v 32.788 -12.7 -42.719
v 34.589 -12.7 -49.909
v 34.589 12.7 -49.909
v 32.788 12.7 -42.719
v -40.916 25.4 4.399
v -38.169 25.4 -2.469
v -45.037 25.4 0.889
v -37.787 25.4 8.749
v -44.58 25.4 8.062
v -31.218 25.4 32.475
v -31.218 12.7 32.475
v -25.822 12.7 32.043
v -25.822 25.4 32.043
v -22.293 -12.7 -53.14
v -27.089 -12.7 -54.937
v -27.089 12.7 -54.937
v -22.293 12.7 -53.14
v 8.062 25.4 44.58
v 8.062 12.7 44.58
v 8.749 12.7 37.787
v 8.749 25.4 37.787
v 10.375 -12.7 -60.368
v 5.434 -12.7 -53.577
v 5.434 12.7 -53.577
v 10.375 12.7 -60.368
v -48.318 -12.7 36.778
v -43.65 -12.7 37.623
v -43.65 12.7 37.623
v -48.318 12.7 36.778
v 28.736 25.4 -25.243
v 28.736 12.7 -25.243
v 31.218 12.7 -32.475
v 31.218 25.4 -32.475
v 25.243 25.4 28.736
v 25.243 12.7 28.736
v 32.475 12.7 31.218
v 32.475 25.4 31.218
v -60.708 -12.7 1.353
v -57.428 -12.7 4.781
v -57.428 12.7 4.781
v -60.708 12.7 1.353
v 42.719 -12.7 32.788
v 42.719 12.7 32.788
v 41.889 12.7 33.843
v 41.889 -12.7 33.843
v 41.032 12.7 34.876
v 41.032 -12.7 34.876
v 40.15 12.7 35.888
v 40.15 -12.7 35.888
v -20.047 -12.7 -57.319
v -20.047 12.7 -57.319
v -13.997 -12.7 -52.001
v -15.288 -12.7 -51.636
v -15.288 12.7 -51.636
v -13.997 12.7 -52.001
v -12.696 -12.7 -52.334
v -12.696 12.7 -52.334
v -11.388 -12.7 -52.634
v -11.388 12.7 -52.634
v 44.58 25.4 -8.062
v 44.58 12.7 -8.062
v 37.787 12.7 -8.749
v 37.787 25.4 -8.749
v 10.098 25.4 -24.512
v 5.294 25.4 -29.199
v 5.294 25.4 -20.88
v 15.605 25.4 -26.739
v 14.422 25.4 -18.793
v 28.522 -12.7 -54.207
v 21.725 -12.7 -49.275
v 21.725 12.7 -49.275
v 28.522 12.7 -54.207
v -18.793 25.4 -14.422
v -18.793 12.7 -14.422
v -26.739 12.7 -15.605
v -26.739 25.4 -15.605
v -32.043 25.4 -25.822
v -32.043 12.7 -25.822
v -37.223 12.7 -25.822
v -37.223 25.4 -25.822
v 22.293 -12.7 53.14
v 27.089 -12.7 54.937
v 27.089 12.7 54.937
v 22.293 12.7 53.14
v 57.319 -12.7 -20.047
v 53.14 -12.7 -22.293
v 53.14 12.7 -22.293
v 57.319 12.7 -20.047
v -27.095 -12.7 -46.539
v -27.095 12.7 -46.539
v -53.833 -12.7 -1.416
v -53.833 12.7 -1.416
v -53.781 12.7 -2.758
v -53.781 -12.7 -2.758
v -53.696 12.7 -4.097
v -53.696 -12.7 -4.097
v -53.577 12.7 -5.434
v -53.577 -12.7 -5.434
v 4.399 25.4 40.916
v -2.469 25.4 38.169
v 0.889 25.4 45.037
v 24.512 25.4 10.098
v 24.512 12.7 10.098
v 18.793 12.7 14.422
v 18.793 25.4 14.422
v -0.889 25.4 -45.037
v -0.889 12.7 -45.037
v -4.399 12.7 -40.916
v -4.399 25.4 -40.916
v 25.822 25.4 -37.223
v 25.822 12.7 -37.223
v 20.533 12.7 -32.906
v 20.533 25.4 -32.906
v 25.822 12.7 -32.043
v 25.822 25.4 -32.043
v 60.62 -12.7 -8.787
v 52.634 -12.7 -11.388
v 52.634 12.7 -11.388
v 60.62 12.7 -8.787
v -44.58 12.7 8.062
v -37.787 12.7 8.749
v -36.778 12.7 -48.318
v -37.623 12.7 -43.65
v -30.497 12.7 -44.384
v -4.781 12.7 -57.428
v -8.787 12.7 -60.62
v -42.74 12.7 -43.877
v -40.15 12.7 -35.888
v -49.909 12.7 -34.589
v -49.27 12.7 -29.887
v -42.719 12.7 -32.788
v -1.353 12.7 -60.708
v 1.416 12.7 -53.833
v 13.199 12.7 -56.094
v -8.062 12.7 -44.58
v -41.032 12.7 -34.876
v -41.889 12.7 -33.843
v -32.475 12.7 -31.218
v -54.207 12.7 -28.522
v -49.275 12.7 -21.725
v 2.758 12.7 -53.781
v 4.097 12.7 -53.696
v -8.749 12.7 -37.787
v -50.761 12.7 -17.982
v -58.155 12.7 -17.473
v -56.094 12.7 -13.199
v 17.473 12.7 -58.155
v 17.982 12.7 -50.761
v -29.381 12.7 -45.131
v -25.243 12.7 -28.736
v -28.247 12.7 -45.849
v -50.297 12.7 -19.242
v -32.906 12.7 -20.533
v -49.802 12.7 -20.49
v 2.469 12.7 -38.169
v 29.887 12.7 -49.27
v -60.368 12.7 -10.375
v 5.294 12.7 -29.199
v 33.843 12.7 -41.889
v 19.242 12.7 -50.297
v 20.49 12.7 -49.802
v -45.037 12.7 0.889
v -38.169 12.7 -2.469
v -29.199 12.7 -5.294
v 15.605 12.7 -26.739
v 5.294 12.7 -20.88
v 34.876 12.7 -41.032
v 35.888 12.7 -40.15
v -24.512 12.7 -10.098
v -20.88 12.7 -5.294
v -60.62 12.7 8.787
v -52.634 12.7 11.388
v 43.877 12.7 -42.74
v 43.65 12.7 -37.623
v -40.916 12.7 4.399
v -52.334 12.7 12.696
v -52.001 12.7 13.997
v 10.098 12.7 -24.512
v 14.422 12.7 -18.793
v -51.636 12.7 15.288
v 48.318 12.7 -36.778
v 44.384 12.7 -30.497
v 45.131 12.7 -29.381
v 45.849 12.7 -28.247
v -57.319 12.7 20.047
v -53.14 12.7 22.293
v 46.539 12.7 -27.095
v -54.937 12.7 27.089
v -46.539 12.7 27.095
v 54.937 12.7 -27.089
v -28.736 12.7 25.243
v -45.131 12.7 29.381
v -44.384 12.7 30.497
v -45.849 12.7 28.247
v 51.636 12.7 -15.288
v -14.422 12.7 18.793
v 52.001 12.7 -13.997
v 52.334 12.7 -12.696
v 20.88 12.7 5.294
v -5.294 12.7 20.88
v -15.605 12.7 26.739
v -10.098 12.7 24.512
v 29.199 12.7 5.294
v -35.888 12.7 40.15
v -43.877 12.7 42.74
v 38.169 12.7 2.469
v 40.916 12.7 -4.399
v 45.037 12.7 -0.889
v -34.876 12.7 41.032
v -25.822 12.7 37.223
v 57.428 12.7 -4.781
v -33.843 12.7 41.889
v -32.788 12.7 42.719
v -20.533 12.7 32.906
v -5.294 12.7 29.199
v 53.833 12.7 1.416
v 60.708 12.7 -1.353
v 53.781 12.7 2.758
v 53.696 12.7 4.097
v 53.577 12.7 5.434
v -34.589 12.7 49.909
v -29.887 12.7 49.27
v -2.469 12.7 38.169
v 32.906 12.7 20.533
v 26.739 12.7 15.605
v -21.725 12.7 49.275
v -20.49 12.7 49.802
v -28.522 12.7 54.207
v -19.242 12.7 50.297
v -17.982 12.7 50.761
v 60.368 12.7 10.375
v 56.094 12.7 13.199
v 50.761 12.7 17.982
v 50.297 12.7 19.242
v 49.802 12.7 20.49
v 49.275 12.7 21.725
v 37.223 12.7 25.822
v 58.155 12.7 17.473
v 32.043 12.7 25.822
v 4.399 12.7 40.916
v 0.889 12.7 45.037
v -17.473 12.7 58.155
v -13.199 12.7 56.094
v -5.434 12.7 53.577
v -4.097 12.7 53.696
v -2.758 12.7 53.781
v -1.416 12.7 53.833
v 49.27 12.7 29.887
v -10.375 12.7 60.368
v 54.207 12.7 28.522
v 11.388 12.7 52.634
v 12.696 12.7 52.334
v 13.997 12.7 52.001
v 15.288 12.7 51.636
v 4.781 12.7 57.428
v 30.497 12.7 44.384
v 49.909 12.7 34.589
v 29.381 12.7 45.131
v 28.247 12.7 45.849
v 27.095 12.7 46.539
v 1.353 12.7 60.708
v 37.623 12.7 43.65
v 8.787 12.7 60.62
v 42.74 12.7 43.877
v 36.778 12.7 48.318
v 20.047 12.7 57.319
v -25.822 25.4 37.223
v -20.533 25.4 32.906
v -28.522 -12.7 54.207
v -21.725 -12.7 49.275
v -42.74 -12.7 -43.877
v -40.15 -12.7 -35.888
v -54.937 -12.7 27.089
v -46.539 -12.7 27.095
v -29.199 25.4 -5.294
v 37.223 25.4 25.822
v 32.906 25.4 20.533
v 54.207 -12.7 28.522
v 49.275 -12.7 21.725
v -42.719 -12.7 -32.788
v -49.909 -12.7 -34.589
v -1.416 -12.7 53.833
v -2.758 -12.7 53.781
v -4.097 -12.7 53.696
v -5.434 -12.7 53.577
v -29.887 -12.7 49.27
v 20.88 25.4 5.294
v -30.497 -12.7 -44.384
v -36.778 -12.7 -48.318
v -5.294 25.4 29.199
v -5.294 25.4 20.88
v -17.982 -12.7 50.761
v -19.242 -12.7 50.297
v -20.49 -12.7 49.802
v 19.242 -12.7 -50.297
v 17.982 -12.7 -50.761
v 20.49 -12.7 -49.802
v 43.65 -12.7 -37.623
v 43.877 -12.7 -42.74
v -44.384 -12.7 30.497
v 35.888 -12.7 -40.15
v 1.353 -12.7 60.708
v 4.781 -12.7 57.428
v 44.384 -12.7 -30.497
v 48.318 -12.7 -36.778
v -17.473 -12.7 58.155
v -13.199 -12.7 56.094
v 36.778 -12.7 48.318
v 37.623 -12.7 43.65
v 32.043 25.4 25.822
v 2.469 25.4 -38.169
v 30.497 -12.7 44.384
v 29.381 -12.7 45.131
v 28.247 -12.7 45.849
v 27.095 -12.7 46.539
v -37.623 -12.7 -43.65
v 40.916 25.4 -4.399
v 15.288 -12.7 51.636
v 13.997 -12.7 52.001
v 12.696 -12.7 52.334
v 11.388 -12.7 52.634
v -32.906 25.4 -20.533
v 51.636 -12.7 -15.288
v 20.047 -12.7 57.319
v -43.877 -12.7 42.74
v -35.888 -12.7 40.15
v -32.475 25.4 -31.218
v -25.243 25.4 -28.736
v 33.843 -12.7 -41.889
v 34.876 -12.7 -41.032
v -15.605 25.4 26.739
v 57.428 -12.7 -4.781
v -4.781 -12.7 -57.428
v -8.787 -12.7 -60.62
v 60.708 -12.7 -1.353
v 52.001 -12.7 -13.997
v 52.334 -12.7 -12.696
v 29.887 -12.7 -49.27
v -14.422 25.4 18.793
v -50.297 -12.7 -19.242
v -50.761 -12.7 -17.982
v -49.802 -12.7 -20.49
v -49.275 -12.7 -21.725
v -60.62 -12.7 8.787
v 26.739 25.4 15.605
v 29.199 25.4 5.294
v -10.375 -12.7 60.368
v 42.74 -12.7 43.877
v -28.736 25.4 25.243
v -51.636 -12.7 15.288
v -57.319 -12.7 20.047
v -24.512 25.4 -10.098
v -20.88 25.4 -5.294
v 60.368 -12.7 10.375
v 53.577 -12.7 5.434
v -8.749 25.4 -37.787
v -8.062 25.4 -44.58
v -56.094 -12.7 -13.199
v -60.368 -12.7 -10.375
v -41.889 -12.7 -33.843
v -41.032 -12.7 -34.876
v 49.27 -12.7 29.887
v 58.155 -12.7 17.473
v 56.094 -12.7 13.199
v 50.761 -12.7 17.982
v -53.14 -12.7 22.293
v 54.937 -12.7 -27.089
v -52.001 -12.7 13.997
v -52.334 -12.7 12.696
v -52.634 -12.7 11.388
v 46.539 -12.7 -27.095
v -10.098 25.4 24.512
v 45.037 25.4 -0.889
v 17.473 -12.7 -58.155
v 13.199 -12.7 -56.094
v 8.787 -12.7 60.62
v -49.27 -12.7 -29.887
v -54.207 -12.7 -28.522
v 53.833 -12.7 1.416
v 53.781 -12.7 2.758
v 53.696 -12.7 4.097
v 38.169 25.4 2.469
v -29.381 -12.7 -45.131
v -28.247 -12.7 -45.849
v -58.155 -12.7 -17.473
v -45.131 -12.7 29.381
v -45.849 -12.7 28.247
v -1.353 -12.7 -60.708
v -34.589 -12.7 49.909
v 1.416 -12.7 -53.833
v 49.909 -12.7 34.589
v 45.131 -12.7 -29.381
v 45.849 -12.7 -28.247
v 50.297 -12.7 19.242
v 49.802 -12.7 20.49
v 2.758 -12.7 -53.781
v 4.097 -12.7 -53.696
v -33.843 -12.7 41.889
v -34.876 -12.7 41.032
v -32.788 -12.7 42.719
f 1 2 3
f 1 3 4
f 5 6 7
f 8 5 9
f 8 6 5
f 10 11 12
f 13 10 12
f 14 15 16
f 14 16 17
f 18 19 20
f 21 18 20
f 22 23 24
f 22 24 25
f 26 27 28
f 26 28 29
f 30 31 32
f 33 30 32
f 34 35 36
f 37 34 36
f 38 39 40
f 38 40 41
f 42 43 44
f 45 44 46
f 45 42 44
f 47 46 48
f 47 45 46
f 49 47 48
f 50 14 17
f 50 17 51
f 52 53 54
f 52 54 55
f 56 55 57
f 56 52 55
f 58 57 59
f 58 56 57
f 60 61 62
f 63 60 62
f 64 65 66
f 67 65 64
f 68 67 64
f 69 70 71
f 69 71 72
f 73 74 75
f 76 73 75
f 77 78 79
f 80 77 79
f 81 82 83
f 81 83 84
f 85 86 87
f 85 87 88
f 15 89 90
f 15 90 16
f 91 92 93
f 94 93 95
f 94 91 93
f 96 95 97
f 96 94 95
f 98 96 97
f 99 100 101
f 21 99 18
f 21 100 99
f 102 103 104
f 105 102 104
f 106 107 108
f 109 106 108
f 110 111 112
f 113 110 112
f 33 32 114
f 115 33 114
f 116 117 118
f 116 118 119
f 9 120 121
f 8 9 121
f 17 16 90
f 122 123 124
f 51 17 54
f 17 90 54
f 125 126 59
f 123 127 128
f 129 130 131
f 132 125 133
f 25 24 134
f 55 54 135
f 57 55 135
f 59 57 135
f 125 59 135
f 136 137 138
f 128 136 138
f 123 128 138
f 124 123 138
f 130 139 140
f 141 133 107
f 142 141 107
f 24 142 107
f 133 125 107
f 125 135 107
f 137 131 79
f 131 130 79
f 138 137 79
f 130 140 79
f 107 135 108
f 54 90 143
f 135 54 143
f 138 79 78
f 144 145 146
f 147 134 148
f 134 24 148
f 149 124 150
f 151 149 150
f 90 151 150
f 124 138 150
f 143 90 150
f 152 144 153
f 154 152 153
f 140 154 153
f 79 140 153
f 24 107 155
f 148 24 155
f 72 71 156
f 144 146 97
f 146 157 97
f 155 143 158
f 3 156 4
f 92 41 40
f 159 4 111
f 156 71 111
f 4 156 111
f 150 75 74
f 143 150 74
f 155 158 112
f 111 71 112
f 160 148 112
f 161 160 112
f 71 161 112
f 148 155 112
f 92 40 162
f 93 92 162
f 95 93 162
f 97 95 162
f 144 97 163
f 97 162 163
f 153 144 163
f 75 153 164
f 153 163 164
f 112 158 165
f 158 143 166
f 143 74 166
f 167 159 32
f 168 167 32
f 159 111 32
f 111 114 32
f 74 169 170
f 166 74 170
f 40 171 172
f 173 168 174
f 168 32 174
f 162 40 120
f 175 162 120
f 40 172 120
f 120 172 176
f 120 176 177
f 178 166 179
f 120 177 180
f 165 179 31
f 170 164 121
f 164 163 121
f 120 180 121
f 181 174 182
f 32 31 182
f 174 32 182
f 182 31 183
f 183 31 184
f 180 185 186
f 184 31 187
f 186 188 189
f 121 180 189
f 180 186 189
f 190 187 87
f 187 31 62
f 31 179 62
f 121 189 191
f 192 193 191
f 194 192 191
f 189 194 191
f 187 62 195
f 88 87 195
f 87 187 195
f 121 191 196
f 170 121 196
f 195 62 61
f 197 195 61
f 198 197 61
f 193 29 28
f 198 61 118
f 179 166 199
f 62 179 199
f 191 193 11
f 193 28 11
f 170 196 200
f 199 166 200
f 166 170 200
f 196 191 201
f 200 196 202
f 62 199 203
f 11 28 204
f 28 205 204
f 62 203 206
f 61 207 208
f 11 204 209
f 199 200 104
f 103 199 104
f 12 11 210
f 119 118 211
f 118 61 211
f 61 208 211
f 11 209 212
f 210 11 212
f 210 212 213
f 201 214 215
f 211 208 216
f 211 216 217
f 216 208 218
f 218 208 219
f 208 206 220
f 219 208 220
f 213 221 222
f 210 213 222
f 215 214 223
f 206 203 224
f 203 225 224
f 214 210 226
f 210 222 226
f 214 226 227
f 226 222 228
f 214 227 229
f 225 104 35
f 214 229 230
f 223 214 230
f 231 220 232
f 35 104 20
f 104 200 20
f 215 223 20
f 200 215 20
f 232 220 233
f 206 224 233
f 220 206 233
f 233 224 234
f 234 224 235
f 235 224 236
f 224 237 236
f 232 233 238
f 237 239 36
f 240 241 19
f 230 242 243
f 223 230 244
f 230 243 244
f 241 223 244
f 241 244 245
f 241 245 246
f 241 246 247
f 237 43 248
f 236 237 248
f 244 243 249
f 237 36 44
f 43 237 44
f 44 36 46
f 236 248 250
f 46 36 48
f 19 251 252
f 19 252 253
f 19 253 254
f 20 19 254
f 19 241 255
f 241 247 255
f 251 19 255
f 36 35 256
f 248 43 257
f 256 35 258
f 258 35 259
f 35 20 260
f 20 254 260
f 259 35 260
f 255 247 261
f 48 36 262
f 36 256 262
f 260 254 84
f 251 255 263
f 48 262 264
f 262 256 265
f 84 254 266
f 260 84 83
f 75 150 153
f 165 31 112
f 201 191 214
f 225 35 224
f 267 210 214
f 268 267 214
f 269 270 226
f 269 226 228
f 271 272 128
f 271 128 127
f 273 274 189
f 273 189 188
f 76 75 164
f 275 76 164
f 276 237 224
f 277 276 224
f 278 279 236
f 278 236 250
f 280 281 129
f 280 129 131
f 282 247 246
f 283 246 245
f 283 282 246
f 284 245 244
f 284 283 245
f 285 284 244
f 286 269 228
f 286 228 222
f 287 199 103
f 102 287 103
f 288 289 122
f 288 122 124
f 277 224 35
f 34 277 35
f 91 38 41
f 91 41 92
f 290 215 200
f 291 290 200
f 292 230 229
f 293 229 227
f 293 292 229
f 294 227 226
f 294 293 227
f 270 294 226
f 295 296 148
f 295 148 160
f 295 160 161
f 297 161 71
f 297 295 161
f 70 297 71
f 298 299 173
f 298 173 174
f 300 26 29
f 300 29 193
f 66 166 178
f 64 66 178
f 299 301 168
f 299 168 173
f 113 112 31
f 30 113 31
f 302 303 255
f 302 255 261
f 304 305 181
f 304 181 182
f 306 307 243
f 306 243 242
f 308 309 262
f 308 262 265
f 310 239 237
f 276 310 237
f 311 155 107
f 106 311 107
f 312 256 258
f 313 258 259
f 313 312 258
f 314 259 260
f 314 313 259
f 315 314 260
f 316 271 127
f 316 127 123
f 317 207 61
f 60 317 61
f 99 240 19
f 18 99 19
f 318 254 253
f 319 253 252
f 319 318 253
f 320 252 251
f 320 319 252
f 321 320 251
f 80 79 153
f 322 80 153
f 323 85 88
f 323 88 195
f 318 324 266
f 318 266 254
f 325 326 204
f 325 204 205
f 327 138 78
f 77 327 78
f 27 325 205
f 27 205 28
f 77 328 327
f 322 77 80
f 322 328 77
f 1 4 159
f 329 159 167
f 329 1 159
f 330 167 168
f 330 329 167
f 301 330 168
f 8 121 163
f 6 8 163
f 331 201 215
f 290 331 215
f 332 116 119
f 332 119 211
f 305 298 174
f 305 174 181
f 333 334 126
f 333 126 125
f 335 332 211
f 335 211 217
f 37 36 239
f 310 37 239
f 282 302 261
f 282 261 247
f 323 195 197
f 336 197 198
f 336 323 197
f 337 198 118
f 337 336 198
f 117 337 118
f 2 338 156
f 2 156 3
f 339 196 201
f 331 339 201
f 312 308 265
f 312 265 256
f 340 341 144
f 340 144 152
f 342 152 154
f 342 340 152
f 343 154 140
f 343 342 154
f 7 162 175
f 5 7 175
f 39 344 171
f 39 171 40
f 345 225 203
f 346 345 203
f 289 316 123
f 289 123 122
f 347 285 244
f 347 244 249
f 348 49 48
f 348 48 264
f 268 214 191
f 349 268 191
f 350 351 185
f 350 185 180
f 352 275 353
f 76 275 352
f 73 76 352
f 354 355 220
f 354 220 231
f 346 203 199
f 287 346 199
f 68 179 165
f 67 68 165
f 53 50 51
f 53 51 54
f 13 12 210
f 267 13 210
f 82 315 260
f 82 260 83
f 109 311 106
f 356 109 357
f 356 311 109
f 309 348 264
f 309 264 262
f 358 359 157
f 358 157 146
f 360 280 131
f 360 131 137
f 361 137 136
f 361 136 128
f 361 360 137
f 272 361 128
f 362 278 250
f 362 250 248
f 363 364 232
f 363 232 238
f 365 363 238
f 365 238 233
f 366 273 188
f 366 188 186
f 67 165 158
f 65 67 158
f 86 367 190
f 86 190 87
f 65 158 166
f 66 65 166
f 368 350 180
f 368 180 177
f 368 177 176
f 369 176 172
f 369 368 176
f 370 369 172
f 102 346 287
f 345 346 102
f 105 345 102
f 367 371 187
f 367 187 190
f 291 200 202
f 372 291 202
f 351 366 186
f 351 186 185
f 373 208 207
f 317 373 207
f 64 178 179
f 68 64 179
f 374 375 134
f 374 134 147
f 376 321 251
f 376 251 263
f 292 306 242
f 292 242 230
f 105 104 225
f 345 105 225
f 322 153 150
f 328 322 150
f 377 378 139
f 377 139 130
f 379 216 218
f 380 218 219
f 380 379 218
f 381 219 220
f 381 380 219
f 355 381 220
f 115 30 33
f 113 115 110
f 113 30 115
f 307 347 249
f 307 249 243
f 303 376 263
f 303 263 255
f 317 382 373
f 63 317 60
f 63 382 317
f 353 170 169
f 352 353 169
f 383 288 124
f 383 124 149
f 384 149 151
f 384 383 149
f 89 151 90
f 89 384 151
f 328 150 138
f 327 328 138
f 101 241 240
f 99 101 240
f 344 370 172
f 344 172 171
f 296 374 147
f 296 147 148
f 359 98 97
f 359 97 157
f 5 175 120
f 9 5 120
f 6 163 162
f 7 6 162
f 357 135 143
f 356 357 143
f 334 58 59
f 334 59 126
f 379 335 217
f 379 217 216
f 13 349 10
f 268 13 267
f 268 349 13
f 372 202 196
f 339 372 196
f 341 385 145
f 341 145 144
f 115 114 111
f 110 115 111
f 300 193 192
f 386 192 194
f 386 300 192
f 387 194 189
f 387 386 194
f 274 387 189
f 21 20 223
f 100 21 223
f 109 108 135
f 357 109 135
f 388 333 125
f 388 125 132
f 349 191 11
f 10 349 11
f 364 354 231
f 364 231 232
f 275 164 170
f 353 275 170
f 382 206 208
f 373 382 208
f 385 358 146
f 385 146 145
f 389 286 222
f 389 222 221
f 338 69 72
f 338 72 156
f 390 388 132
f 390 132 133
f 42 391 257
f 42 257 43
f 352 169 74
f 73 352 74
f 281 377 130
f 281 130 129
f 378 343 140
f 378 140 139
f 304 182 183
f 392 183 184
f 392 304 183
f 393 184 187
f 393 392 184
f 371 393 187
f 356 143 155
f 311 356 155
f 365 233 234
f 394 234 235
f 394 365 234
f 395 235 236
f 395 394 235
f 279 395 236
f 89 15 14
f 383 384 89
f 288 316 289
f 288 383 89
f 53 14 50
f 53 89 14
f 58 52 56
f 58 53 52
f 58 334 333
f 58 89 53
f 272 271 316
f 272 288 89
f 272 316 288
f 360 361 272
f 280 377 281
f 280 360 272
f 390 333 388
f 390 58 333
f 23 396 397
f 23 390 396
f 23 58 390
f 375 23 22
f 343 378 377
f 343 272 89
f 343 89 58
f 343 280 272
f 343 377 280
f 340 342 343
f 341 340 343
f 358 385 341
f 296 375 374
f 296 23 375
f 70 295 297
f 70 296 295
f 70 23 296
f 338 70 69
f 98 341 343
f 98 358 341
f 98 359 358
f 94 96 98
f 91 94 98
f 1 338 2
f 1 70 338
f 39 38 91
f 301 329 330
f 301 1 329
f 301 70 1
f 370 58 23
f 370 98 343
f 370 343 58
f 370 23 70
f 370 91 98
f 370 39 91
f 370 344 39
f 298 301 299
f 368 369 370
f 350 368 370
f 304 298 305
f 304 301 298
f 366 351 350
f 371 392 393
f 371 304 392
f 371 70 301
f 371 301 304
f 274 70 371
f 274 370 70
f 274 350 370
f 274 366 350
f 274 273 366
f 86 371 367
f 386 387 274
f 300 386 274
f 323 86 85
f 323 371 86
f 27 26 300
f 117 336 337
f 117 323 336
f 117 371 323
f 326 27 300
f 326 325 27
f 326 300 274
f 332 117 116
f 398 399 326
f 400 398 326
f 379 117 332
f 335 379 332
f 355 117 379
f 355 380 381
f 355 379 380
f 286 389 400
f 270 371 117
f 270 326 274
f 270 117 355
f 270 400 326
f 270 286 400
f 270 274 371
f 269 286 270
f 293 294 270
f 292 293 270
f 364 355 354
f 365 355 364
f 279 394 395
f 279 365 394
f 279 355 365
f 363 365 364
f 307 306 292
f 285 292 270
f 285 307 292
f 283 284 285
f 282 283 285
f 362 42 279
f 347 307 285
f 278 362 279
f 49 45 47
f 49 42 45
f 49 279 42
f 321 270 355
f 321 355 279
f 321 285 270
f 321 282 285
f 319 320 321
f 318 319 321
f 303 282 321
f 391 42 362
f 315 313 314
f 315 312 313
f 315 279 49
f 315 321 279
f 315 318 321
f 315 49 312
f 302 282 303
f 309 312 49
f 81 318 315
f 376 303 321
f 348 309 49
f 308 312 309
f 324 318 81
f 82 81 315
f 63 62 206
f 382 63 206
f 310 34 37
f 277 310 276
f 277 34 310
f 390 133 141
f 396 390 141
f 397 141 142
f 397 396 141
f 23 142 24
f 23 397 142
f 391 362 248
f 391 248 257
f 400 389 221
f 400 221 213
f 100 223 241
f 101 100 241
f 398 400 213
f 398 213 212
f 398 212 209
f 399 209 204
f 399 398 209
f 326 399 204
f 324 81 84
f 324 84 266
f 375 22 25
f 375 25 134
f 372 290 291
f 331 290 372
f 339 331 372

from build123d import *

# Parameters (mm, degrees)
F0_R            = 53.8517918496
F1_DEPTH        = 12.7
F3_DEPTH        = 25.4
F3_COPIES_COUNT = 20
F5_DEPTH        = 12.7
F5_COPIES_COUNT = 8
F7_DEPTH        = 12.7
F7_COPIES_COUNT = 4


# Not quite as in the source:
# - a pattern or mirror of a feature is missing from the dataset's text; its kind, count and spacing are read off the source's solid


with BuildPart() as f1:
    # F0 (on Front) → F1 (new body, symmetric)
    with BuildSketch(Plane.XZ):
        Circle(F0_R)
    extrude(amount=F1_DEPTH, both=True)

    # F2 (on face) → F3 (join, through all)
    with BuildSketch(Plane.XZ.offset(12.7)):
        Polygon((17.4729507416, -58.154836297), (17.9823680134, -50.7607124264), (5.4343099044, -53.5768957786), (10.3754857555, -60.3680238128), (13.1992083043, -56.0942813754), align=None)
    f3 = extrude(amount=-F3_DEPTH)

    # F3_copies: F3 ×20 about axis
    f3_copies_axis = Axis((0, 0, 0), (0, 1, 0))
    for i in range(1, F3_COPIES_COUNT):
        add(f3.rotate(f3_copies_axis, i * 360 / F3_COPIES_COUNT))

    # F4 (on face) → F5 (join)
    with BuildSketch(Plane(origin=(0, 12.7, 0), x_dir=(-1, 0, 0), z_dir=(0, 1, 0))):
        Polygon((32.4746519327, -31.217938289), (32.0429392159, -25.8215237409), (37.223495543, -25.8215237409), (32.9063646495, -20.5330364406), (25.2434555441, -28.7355873734), align=None)
    f5 = extrude(amount=F5_DEPTH)

    # F5_copies: F5 ×8 about axis
    f5_copies_axis = Axis((0, 0, 0), (0, 1, 0))
    for i in range(1, F5_COPIES_COUNT):
        add(f5.rotate(f5_copies_axis, i * 360 / F5_COPIES_COUNT))

    # F6 (on face) → F7 (join)
    with BuildSketch(Plane(origin=(0, 12.7, 0), x_dir=(-1, 0, 0), z_dir=(0, 1, 0))):
        Polygon((-18.7933090678, 14.4219585457), (-26.7386548221, 15.6052242965), (-29.1993897408, 5.2935681306), (-20.8797585219, 5.2935681306), (-24.5122741908, 10.0978622213), align=None)
    f7 = extrude(amount=F7_DEPTH)

    # F7_copies: F7 ×4 about axis
    f7_copies_axis = Axis((0, 0, 0), (0, 1, 0))
    for i in range(1, F7_COPIES_COUNT):
        add(f7.rotate(f7_copies_axis, i * 360 / F7_COPIES_COUNT))


solid = f1.part
